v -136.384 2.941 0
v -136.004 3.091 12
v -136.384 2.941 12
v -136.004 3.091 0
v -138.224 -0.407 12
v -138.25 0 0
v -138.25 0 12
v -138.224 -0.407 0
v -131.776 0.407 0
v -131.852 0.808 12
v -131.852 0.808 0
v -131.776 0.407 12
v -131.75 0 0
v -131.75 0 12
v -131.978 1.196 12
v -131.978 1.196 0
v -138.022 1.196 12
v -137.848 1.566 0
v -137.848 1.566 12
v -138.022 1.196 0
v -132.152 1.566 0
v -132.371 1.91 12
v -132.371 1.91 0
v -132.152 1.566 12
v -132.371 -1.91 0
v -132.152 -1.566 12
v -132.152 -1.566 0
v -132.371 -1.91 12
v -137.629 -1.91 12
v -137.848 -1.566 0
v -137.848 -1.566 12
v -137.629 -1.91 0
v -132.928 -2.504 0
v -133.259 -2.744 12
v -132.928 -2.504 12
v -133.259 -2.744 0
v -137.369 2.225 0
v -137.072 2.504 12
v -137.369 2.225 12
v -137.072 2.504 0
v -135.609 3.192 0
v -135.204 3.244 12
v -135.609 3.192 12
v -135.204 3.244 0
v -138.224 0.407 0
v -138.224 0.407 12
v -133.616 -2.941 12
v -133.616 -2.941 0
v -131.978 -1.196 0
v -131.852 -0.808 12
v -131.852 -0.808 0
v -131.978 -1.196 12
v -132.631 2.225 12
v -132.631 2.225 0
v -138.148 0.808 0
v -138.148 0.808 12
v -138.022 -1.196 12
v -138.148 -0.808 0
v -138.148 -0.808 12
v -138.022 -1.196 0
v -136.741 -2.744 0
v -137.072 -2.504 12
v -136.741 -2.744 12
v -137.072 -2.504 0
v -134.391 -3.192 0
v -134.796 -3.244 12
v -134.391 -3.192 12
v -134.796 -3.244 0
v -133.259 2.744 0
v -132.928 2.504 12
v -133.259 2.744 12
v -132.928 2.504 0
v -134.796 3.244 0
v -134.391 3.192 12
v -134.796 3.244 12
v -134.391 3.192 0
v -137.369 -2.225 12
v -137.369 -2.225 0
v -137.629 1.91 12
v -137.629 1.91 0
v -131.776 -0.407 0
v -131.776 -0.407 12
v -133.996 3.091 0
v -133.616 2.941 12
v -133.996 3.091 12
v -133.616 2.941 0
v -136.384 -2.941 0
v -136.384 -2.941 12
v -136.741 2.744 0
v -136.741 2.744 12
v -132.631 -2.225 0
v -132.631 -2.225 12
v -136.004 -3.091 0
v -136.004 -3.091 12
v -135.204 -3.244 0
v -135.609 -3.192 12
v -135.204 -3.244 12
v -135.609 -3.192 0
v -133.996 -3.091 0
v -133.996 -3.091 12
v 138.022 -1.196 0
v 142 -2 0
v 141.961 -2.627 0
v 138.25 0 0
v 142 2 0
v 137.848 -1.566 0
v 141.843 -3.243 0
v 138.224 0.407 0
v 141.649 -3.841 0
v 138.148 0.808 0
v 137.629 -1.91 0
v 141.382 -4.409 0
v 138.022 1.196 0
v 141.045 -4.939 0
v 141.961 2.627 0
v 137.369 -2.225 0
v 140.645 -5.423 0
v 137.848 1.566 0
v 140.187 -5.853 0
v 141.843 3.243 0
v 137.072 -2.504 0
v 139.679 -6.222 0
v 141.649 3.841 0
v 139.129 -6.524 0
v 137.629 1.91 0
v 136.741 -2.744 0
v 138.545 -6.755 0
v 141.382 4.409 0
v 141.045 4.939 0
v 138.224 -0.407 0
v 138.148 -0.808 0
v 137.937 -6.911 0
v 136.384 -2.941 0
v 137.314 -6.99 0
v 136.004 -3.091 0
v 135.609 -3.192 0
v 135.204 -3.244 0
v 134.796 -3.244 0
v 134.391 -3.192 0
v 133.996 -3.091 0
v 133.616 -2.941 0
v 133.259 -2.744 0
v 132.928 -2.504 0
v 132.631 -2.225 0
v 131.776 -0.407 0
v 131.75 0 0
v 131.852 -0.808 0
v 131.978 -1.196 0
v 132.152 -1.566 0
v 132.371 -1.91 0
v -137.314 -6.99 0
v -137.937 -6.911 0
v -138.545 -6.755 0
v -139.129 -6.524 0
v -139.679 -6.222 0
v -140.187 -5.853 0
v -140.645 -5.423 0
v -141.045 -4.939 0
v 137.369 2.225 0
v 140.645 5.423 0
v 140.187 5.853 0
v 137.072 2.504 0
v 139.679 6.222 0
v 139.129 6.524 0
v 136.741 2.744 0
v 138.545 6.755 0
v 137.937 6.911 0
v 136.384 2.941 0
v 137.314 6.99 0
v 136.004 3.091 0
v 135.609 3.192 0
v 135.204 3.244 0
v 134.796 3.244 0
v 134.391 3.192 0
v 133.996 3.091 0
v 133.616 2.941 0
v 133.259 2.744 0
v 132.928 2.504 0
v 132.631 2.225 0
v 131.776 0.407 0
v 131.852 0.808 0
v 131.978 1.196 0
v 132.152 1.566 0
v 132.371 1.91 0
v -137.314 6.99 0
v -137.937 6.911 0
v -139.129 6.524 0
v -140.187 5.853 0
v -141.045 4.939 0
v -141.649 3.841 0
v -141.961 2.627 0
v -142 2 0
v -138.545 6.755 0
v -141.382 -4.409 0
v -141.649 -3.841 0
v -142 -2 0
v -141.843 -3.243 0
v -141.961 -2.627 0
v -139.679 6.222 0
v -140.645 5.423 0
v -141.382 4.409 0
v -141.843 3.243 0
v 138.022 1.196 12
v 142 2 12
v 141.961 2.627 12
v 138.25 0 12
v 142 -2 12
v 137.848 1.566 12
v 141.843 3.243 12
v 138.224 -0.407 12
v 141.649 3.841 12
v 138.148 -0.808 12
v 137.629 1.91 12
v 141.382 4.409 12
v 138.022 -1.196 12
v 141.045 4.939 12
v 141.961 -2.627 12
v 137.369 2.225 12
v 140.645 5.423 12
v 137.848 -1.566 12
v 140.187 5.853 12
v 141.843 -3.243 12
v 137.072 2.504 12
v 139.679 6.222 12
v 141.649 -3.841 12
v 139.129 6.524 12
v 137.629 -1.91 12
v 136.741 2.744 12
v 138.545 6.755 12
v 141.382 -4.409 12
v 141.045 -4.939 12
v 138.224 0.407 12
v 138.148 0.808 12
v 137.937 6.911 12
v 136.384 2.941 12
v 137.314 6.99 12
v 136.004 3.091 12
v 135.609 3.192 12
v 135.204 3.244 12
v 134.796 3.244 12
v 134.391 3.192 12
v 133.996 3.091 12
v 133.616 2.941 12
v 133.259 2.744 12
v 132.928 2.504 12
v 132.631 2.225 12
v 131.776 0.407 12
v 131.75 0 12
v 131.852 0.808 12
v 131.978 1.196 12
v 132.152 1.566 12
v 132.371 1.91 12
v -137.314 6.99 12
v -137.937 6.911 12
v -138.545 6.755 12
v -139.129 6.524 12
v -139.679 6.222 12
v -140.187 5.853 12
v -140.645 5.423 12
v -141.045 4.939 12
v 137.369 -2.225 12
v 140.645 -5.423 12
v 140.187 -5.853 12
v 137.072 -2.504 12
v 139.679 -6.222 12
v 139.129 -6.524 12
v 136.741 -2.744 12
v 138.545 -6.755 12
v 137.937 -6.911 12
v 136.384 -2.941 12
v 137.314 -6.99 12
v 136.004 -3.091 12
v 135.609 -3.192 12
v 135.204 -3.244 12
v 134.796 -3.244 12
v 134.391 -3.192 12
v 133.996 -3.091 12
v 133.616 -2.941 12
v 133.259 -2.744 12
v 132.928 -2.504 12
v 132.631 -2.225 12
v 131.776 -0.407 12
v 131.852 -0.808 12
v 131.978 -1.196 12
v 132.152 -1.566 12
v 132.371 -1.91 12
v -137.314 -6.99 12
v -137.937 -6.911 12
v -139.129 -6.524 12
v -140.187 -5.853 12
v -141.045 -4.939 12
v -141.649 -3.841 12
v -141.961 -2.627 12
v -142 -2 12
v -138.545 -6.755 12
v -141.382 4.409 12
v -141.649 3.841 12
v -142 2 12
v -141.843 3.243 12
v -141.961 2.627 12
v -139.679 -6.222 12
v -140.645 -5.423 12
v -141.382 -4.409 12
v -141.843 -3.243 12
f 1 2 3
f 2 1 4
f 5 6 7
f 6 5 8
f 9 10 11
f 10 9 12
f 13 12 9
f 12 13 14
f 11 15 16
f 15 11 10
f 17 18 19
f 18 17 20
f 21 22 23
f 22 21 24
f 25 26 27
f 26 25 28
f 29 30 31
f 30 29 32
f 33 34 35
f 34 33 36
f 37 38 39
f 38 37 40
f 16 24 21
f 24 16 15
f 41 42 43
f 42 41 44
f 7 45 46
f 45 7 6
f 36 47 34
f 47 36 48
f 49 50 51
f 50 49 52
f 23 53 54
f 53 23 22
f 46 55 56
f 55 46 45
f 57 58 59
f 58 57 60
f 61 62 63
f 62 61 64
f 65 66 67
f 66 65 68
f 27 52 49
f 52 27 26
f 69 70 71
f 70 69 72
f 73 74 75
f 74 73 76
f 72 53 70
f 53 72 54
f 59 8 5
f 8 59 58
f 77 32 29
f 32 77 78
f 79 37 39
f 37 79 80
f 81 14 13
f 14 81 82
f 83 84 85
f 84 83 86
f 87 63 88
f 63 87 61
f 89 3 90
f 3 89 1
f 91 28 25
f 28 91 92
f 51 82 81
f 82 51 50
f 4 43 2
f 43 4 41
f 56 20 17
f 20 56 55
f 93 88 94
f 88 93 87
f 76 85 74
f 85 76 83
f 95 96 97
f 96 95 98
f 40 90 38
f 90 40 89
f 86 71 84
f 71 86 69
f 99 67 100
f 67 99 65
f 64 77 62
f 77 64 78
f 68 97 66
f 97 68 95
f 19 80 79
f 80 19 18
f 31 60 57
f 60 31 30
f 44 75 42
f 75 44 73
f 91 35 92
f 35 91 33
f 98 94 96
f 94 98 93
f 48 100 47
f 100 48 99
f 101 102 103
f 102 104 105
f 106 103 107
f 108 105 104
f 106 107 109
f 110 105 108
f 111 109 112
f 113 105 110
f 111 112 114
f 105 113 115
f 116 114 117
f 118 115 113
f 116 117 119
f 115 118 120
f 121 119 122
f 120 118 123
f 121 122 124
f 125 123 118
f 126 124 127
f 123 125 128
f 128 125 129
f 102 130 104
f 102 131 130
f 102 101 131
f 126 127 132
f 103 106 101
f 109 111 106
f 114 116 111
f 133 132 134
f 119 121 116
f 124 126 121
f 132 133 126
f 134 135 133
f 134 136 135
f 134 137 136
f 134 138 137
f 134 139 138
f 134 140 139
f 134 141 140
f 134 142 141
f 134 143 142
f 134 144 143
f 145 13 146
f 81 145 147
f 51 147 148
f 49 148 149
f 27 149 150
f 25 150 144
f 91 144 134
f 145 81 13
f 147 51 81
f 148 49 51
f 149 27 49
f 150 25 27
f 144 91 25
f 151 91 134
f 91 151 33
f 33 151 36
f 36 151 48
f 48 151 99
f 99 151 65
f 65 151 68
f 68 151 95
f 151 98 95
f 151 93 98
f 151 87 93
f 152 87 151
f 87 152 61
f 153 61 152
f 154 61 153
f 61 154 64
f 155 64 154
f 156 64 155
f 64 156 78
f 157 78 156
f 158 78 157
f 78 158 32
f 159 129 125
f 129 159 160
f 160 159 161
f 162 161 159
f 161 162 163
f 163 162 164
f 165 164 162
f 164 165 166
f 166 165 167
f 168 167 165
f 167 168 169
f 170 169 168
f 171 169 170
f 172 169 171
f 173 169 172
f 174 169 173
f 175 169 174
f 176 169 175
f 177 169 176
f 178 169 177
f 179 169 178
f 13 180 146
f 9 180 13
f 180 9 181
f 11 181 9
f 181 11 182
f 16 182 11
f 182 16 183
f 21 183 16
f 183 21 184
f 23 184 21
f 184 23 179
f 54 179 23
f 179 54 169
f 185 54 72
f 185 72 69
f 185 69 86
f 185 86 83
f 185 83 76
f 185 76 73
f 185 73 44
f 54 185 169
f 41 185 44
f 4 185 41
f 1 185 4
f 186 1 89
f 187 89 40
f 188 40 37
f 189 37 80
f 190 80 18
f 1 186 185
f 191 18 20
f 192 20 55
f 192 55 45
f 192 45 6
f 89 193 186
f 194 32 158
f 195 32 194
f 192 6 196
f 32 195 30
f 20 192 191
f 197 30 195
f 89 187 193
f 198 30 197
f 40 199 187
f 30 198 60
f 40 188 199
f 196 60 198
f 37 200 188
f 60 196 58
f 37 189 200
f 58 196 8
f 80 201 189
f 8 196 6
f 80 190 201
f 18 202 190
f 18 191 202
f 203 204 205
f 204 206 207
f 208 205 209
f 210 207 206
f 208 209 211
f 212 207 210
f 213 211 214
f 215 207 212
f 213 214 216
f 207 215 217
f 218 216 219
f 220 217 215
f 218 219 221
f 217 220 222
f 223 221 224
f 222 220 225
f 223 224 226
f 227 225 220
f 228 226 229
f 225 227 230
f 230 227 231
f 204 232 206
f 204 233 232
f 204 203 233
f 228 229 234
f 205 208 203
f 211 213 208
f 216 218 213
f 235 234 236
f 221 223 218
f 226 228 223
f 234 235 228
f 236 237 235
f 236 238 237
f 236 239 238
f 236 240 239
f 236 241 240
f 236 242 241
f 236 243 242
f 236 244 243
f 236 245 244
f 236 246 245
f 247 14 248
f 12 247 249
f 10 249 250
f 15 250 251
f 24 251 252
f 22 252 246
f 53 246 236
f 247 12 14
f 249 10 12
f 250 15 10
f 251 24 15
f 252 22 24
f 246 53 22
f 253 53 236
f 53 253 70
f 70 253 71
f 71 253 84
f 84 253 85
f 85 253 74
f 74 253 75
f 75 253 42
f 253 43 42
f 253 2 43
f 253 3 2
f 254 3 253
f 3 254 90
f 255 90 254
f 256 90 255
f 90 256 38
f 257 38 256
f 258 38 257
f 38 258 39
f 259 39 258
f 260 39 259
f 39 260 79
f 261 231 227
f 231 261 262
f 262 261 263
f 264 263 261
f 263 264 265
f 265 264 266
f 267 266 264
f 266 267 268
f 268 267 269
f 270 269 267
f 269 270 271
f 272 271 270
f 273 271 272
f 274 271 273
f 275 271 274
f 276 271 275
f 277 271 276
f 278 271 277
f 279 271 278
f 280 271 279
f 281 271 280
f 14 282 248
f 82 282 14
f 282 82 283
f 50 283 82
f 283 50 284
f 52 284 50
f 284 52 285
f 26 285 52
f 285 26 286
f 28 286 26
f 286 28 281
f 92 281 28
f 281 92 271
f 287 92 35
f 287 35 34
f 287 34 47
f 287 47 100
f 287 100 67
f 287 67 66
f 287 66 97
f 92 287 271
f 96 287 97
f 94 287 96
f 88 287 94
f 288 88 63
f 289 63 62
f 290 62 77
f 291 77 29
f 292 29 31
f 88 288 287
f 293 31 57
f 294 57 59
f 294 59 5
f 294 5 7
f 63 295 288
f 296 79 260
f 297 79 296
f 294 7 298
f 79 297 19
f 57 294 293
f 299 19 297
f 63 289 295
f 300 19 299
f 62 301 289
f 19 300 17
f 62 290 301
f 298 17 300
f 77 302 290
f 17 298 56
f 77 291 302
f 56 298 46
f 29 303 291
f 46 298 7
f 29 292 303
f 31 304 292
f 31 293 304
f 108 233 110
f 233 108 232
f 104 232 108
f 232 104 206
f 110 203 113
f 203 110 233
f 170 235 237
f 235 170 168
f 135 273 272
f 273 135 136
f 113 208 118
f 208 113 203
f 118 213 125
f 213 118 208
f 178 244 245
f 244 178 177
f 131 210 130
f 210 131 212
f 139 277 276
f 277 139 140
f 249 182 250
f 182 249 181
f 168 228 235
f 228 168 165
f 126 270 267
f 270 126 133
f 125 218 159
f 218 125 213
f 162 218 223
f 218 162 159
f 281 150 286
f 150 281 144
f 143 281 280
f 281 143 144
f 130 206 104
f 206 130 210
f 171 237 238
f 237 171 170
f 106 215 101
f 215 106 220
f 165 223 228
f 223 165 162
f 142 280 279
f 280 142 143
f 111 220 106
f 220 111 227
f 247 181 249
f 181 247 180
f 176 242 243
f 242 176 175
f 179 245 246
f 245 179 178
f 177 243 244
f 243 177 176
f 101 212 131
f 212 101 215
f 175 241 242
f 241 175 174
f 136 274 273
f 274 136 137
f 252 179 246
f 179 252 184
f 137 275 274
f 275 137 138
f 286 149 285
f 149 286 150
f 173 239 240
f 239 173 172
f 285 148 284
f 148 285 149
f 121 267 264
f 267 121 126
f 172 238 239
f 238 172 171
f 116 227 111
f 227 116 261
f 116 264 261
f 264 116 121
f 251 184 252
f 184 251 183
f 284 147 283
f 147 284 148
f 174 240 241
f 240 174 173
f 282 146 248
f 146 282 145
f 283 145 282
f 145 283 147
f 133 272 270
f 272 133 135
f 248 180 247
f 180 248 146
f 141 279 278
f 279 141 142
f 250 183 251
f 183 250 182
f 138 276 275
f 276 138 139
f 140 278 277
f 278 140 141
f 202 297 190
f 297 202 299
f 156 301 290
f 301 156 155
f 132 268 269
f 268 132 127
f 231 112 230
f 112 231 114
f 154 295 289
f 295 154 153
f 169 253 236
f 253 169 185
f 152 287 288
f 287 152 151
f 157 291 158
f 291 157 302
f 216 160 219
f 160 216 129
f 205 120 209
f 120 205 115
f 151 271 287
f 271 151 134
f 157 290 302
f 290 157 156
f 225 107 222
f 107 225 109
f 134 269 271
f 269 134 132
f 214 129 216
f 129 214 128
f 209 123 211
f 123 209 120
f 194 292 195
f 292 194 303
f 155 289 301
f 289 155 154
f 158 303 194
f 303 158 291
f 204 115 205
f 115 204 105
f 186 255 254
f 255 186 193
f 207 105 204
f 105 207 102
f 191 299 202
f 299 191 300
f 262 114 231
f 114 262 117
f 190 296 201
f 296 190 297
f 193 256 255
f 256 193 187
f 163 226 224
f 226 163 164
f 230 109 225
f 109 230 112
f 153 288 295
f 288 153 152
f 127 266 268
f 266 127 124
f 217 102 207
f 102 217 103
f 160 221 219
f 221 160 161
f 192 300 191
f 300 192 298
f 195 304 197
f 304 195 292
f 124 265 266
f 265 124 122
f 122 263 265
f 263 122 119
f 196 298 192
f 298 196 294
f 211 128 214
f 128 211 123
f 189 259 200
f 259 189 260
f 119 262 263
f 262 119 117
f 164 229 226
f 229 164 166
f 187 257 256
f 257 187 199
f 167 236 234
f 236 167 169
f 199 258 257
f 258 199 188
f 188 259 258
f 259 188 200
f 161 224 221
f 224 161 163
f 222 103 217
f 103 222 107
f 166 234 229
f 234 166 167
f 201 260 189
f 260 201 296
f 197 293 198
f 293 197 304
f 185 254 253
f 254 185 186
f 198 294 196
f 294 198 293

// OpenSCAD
$fn = 50;


difference() {
	union() {
		hull() {
			translate(v = [-137.0000000000, 2.0000000000, 0]) {
				cylinder(h = 12, r = 5);
			}
			translate(v = [137.0000000000, 2.0000000000, 0]) {
				cylinder(h = 12, r = 5);
			}
			translate(v = [-137.0000000000, -2.0000000000, 0]) {
				cylinder(h = 12, r = 5);
			}
			translate(v = [137.0000000000, -2.0000000000, 0]) {
				cylinder(h = 12, r = 5);
			}
		}
	}
	union() {
		translate(v = [-135.0000000000, 0.0000000000, 0]) {
			cylinder(h = 12, r = 3.2500000000);
		}
		translate(v = [135.0000000000, 0.0000000000, 0]) {
			cylinder(h = 12, r = 3.2500000000);
		}
		translate(v = [-135.0000000000, 0.0000000000, 0]) {
			cylinder(h = 12, r = 1.8000000000);
		}
		translate(v = [135.0000000000, 0.0000000000, 0]) {
			cylinder(h = 12, r = 1.8000000000);
		}
		translate(v = [-135.0000000000, 0.0000000000, 0]) {
			cylinder(h = 12, r = 1.8000000000);
		}
		translate(v = [135.0000000000, 0.0000000000, 0]) {
			cylinder(h = 12, r = 1.8000000000);
		}
		translate(v = [-135.0000000000, 0.0000000000, 0]) {
			cylinder(h = 12, r = 1.8000000000);
		}
		translate(v = [135.0000000000, 0.0000000000, 0]) {
			cylinder(h = 12, r = 1.8000000000);
		}
	}
}
